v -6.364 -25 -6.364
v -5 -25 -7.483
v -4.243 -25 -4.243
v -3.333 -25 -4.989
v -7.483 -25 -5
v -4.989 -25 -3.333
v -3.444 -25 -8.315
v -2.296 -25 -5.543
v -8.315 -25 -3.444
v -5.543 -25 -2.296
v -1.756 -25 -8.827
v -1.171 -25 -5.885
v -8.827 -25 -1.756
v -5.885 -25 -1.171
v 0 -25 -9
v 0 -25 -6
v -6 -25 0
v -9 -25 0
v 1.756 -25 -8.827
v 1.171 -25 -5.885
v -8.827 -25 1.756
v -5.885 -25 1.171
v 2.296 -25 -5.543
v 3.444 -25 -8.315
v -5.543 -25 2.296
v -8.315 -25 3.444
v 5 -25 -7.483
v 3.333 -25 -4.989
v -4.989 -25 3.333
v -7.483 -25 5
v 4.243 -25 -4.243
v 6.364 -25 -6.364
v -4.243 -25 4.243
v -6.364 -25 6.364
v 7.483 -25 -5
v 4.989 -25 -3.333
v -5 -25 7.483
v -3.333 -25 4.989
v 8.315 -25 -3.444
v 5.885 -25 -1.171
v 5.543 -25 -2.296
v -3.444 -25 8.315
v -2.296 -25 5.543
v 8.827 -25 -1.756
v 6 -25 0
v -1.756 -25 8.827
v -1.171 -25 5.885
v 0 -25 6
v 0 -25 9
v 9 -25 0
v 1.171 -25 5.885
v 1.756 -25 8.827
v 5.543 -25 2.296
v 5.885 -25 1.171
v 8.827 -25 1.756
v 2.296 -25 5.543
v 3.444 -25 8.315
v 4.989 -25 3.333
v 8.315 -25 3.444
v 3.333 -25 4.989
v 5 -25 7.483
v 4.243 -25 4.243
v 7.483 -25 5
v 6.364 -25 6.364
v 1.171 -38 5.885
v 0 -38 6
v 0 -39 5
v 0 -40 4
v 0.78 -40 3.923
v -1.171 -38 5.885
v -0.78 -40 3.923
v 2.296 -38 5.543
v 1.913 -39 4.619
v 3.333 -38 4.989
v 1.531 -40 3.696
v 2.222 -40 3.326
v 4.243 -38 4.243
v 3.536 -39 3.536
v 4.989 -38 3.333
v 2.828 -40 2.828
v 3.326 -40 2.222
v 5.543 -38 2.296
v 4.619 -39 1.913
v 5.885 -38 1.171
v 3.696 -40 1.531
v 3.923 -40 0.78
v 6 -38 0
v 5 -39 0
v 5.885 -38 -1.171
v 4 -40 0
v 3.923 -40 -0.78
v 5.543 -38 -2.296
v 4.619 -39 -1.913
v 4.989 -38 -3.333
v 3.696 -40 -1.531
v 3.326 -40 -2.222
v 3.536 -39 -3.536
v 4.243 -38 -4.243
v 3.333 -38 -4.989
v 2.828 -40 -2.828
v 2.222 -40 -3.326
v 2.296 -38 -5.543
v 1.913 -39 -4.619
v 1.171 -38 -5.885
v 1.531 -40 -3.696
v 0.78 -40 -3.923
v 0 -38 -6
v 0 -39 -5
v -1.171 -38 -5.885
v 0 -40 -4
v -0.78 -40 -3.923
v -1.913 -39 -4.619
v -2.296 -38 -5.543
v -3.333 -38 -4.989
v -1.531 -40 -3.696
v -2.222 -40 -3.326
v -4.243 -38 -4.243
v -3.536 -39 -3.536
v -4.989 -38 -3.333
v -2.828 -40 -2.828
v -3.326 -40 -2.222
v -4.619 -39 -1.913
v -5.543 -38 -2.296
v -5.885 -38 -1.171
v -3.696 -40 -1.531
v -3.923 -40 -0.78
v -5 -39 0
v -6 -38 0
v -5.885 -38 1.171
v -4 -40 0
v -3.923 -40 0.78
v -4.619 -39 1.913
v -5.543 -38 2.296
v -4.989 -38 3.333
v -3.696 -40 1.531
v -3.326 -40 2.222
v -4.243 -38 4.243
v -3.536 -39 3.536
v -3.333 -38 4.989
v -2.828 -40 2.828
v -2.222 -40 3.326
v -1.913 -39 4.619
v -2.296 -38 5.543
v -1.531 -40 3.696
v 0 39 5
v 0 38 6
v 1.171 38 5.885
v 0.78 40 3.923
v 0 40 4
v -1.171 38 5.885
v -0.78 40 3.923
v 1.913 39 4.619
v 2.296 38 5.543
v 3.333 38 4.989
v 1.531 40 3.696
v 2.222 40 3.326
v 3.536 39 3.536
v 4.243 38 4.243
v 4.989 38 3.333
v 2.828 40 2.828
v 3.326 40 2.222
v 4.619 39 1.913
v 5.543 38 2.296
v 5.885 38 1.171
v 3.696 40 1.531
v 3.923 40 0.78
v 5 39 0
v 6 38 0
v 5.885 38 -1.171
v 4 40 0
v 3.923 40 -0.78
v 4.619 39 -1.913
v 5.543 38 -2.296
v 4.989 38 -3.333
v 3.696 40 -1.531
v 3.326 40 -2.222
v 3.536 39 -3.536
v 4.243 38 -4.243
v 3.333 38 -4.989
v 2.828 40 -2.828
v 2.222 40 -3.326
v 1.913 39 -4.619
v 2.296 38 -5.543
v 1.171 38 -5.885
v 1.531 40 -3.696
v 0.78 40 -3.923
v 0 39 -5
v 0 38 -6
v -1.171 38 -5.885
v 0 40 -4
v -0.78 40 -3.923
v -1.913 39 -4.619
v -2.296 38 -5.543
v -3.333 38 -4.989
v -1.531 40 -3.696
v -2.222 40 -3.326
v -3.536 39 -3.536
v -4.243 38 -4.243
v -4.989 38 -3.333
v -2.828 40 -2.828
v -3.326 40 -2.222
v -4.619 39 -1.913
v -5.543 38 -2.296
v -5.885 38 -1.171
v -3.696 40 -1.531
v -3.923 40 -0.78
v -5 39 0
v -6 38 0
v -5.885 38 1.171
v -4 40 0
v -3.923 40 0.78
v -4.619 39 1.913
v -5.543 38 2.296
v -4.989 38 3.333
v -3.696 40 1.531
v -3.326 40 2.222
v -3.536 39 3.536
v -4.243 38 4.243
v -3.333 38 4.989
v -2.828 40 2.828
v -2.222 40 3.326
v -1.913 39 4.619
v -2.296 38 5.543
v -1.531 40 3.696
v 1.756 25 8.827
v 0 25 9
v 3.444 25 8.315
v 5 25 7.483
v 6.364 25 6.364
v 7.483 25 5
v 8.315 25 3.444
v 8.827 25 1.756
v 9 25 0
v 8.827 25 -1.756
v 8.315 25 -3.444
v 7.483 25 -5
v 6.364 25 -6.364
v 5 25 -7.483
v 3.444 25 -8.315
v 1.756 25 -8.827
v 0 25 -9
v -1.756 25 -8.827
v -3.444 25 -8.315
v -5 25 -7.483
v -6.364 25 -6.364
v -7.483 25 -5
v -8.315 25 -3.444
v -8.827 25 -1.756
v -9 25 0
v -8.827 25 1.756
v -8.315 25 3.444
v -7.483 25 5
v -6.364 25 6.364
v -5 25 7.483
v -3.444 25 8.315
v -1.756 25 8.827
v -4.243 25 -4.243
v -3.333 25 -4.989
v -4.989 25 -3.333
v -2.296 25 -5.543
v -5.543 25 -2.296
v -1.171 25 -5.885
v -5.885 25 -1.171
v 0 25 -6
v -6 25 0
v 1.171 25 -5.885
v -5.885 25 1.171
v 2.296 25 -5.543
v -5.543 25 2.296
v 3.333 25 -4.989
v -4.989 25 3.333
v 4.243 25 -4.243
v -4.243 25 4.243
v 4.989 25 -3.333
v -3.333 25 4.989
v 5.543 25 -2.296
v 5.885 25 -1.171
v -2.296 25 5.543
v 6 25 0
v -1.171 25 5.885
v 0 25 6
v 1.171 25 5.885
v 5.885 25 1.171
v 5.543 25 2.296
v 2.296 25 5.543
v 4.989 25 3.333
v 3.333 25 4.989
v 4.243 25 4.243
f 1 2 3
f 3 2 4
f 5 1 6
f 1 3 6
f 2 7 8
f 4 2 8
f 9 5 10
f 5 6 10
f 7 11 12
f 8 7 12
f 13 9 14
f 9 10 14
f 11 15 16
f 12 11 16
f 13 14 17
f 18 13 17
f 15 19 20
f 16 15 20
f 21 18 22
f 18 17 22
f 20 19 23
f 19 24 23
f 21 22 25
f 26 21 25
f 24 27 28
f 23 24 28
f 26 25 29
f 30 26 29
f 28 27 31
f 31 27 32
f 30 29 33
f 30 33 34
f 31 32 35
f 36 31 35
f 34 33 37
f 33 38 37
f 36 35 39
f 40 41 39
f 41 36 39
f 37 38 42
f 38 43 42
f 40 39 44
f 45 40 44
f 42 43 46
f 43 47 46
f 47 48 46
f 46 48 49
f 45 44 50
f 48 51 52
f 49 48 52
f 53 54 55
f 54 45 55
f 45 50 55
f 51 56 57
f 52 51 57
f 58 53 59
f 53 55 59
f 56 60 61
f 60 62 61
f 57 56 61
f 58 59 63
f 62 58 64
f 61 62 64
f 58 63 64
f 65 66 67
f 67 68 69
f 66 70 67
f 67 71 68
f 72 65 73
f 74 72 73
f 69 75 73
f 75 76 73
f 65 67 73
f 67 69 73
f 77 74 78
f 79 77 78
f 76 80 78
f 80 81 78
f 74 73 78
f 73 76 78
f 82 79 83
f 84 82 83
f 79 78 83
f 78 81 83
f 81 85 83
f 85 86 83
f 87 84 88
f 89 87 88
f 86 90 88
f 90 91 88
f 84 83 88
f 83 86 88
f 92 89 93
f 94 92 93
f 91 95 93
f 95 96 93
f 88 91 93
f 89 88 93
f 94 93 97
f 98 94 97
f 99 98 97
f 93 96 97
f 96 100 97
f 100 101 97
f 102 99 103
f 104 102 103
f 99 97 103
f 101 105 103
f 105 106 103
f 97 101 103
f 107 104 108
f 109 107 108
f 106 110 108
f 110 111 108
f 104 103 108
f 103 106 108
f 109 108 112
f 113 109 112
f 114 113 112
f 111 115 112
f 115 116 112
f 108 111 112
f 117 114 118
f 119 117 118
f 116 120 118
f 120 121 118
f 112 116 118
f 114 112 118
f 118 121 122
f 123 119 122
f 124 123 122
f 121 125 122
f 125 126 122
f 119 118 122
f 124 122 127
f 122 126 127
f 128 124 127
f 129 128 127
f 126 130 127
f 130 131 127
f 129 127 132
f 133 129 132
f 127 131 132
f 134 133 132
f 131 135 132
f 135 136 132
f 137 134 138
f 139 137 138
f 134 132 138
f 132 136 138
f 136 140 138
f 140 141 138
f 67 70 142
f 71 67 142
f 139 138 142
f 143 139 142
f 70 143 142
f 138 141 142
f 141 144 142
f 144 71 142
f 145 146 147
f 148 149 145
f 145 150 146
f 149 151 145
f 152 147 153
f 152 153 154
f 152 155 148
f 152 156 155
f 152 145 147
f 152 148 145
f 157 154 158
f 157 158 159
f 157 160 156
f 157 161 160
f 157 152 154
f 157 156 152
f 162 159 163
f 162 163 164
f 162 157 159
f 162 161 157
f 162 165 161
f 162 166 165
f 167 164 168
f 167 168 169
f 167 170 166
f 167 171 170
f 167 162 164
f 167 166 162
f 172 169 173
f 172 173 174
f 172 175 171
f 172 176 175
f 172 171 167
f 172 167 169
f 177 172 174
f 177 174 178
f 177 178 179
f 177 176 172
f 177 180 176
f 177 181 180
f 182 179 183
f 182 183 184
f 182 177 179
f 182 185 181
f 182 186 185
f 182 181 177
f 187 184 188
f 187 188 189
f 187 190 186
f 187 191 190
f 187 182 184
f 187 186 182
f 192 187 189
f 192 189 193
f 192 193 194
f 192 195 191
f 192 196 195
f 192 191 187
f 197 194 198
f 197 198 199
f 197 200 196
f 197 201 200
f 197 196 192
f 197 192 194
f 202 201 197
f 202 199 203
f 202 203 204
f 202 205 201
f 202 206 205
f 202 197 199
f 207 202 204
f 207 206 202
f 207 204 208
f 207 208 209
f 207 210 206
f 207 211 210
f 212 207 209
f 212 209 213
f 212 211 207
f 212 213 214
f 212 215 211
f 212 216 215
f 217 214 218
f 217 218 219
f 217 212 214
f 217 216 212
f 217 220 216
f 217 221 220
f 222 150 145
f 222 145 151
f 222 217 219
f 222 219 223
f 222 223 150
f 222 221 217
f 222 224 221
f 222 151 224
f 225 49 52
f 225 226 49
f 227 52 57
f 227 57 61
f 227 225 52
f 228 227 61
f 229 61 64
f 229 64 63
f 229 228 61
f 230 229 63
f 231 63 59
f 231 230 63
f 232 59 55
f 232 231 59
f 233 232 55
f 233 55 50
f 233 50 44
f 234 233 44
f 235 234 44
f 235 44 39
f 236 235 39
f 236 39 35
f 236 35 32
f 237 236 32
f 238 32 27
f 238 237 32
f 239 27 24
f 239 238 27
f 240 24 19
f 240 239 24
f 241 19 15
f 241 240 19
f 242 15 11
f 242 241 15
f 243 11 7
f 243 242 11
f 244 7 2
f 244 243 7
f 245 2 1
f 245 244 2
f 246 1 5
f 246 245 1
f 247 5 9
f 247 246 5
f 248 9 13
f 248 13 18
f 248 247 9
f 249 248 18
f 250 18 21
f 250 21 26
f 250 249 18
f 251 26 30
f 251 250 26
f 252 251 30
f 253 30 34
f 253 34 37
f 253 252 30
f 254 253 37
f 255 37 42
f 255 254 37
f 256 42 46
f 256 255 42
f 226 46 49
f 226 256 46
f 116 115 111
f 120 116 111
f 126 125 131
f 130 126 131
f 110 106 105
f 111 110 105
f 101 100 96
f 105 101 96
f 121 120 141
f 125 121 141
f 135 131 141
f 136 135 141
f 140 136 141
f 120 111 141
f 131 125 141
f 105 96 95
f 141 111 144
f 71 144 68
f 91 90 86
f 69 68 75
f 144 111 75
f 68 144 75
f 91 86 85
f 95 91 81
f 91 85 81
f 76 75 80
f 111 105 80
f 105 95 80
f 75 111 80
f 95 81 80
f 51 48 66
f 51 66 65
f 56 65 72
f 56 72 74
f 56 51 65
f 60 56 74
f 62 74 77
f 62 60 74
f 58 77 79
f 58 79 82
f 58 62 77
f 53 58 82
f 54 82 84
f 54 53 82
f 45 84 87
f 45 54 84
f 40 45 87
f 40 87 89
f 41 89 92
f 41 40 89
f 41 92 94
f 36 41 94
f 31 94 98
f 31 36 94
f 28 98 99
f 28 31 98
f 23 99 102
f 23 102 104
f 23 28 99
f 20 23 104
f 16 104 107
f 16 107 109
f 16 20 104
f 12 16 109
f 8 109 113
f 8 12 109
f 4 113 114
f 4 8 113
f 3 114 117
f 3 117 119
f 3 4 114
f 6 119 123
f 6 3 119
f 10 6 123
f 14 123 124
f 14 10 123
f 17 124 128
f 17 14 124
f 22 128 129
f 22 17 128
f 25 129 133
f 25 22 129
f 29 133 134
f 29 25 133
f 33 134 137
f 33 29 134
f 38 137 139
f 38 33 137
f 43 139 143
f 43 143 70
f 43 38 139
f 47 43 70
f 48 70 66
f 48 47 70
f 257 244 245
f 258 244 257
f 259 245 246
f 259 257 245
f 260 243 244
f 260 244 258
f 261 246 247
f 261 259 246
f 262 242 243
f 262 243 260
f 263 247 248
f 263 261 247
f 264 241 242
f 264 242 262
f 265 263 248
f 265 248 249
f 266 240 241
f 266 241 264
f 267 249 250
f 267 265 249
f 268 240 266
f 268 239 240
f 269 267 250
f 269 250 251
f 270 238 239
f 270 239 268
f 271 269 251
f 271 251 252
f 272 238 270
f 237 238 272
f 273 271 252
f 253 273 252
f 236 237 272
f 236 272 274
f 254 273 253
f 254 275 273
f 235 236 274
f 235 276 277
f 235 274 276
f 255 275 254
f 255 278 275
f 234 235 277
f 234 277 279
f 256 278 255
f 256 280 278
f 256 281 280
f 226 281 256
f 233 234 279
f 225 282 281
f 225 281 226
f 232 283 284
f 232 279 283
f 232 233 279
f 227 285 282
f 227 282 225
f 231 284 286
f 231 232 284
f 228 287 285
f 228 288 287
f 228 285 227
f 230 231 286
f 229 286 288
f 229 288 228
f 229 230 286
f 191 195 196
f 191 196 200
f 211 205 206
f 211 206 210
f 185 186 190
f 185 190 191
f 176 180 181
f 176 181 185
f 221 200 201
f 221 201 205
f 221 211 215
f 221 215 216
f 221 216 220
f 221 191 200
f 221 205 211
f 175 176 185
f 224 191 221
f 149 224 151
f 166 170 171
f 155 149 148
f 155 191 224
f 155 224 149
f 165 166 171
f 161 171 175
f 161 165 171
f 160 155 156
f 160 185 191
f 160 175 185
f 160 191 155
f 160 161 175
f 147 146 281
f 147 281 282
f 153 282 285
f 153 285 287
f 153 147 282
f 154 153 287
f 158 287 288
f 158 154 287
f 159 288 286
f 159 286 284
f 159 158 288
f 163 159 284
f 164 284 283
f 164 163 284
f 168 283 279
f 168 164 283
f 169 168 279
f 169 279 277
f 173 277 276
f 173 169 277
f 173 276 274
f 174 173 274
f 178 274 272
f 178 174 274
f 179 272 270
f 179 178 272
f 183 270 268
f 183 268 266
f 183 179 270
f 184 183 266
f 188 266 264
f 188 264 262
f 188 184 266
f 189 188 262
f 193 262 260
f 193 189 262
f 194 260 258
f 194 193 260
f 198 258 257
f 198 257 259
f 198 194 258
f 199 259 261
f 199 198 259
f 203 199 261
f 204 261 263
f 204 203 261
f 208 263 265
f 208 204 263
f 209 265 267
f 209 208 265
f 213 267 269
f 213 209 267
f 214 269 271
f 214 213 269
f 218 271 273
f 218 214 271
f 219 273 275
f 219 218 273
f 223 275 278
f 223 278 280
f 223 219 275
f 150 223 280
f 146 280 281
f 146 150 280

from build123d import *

# Parameters (mm, degrees)
SKETCH1_R           = 9
BOSS_EXTRUDE1_DEPTH = 25
SKETCH2_R           = 6
BOSS_EXTRUDE2_DEPTH = 40
CHAMFER1_SIZE       = 2


with BuildPart() as part:
    # Sketch1 → Boss-Extrude1 (new, symmetric)
    with BuildSketch(Plane(origin=(0, 0, 0), x_dir=(1, 0, 0), z_dir=(0, 1, 0))):
        with Locations(Location((0, 0, 0), (0, 0, 270))):
            Circle(SKETCH1_R)
    extrude(amount=BOSS_EXTRUDE1_DEPTH, both=True)

    # Sketch2 → Boss-Extrude2 (add, symmetric)
    with BuildSketch(Plane(origin=(0, 0, 0), x_dir=(1, 0, 0), z_dir=(0, 1, 0))):
        with Locations(Location((0, 0, 0), (0, 0, 270))):
            Circle(SKETCH2_R)
    extrude(amount=BOSS_EXTRUDE2_DEPTH, both=True)

    # Chamfer1
    chamfer1_edges = [part.edges().sort_by_distance(p)[0] for p in [
        (0, -40, -6),
        (0, 40, -6),
    ]]
    chamfer(chamfer1_edges, length=CHAMFER1_SIZE)


solid = part.part
